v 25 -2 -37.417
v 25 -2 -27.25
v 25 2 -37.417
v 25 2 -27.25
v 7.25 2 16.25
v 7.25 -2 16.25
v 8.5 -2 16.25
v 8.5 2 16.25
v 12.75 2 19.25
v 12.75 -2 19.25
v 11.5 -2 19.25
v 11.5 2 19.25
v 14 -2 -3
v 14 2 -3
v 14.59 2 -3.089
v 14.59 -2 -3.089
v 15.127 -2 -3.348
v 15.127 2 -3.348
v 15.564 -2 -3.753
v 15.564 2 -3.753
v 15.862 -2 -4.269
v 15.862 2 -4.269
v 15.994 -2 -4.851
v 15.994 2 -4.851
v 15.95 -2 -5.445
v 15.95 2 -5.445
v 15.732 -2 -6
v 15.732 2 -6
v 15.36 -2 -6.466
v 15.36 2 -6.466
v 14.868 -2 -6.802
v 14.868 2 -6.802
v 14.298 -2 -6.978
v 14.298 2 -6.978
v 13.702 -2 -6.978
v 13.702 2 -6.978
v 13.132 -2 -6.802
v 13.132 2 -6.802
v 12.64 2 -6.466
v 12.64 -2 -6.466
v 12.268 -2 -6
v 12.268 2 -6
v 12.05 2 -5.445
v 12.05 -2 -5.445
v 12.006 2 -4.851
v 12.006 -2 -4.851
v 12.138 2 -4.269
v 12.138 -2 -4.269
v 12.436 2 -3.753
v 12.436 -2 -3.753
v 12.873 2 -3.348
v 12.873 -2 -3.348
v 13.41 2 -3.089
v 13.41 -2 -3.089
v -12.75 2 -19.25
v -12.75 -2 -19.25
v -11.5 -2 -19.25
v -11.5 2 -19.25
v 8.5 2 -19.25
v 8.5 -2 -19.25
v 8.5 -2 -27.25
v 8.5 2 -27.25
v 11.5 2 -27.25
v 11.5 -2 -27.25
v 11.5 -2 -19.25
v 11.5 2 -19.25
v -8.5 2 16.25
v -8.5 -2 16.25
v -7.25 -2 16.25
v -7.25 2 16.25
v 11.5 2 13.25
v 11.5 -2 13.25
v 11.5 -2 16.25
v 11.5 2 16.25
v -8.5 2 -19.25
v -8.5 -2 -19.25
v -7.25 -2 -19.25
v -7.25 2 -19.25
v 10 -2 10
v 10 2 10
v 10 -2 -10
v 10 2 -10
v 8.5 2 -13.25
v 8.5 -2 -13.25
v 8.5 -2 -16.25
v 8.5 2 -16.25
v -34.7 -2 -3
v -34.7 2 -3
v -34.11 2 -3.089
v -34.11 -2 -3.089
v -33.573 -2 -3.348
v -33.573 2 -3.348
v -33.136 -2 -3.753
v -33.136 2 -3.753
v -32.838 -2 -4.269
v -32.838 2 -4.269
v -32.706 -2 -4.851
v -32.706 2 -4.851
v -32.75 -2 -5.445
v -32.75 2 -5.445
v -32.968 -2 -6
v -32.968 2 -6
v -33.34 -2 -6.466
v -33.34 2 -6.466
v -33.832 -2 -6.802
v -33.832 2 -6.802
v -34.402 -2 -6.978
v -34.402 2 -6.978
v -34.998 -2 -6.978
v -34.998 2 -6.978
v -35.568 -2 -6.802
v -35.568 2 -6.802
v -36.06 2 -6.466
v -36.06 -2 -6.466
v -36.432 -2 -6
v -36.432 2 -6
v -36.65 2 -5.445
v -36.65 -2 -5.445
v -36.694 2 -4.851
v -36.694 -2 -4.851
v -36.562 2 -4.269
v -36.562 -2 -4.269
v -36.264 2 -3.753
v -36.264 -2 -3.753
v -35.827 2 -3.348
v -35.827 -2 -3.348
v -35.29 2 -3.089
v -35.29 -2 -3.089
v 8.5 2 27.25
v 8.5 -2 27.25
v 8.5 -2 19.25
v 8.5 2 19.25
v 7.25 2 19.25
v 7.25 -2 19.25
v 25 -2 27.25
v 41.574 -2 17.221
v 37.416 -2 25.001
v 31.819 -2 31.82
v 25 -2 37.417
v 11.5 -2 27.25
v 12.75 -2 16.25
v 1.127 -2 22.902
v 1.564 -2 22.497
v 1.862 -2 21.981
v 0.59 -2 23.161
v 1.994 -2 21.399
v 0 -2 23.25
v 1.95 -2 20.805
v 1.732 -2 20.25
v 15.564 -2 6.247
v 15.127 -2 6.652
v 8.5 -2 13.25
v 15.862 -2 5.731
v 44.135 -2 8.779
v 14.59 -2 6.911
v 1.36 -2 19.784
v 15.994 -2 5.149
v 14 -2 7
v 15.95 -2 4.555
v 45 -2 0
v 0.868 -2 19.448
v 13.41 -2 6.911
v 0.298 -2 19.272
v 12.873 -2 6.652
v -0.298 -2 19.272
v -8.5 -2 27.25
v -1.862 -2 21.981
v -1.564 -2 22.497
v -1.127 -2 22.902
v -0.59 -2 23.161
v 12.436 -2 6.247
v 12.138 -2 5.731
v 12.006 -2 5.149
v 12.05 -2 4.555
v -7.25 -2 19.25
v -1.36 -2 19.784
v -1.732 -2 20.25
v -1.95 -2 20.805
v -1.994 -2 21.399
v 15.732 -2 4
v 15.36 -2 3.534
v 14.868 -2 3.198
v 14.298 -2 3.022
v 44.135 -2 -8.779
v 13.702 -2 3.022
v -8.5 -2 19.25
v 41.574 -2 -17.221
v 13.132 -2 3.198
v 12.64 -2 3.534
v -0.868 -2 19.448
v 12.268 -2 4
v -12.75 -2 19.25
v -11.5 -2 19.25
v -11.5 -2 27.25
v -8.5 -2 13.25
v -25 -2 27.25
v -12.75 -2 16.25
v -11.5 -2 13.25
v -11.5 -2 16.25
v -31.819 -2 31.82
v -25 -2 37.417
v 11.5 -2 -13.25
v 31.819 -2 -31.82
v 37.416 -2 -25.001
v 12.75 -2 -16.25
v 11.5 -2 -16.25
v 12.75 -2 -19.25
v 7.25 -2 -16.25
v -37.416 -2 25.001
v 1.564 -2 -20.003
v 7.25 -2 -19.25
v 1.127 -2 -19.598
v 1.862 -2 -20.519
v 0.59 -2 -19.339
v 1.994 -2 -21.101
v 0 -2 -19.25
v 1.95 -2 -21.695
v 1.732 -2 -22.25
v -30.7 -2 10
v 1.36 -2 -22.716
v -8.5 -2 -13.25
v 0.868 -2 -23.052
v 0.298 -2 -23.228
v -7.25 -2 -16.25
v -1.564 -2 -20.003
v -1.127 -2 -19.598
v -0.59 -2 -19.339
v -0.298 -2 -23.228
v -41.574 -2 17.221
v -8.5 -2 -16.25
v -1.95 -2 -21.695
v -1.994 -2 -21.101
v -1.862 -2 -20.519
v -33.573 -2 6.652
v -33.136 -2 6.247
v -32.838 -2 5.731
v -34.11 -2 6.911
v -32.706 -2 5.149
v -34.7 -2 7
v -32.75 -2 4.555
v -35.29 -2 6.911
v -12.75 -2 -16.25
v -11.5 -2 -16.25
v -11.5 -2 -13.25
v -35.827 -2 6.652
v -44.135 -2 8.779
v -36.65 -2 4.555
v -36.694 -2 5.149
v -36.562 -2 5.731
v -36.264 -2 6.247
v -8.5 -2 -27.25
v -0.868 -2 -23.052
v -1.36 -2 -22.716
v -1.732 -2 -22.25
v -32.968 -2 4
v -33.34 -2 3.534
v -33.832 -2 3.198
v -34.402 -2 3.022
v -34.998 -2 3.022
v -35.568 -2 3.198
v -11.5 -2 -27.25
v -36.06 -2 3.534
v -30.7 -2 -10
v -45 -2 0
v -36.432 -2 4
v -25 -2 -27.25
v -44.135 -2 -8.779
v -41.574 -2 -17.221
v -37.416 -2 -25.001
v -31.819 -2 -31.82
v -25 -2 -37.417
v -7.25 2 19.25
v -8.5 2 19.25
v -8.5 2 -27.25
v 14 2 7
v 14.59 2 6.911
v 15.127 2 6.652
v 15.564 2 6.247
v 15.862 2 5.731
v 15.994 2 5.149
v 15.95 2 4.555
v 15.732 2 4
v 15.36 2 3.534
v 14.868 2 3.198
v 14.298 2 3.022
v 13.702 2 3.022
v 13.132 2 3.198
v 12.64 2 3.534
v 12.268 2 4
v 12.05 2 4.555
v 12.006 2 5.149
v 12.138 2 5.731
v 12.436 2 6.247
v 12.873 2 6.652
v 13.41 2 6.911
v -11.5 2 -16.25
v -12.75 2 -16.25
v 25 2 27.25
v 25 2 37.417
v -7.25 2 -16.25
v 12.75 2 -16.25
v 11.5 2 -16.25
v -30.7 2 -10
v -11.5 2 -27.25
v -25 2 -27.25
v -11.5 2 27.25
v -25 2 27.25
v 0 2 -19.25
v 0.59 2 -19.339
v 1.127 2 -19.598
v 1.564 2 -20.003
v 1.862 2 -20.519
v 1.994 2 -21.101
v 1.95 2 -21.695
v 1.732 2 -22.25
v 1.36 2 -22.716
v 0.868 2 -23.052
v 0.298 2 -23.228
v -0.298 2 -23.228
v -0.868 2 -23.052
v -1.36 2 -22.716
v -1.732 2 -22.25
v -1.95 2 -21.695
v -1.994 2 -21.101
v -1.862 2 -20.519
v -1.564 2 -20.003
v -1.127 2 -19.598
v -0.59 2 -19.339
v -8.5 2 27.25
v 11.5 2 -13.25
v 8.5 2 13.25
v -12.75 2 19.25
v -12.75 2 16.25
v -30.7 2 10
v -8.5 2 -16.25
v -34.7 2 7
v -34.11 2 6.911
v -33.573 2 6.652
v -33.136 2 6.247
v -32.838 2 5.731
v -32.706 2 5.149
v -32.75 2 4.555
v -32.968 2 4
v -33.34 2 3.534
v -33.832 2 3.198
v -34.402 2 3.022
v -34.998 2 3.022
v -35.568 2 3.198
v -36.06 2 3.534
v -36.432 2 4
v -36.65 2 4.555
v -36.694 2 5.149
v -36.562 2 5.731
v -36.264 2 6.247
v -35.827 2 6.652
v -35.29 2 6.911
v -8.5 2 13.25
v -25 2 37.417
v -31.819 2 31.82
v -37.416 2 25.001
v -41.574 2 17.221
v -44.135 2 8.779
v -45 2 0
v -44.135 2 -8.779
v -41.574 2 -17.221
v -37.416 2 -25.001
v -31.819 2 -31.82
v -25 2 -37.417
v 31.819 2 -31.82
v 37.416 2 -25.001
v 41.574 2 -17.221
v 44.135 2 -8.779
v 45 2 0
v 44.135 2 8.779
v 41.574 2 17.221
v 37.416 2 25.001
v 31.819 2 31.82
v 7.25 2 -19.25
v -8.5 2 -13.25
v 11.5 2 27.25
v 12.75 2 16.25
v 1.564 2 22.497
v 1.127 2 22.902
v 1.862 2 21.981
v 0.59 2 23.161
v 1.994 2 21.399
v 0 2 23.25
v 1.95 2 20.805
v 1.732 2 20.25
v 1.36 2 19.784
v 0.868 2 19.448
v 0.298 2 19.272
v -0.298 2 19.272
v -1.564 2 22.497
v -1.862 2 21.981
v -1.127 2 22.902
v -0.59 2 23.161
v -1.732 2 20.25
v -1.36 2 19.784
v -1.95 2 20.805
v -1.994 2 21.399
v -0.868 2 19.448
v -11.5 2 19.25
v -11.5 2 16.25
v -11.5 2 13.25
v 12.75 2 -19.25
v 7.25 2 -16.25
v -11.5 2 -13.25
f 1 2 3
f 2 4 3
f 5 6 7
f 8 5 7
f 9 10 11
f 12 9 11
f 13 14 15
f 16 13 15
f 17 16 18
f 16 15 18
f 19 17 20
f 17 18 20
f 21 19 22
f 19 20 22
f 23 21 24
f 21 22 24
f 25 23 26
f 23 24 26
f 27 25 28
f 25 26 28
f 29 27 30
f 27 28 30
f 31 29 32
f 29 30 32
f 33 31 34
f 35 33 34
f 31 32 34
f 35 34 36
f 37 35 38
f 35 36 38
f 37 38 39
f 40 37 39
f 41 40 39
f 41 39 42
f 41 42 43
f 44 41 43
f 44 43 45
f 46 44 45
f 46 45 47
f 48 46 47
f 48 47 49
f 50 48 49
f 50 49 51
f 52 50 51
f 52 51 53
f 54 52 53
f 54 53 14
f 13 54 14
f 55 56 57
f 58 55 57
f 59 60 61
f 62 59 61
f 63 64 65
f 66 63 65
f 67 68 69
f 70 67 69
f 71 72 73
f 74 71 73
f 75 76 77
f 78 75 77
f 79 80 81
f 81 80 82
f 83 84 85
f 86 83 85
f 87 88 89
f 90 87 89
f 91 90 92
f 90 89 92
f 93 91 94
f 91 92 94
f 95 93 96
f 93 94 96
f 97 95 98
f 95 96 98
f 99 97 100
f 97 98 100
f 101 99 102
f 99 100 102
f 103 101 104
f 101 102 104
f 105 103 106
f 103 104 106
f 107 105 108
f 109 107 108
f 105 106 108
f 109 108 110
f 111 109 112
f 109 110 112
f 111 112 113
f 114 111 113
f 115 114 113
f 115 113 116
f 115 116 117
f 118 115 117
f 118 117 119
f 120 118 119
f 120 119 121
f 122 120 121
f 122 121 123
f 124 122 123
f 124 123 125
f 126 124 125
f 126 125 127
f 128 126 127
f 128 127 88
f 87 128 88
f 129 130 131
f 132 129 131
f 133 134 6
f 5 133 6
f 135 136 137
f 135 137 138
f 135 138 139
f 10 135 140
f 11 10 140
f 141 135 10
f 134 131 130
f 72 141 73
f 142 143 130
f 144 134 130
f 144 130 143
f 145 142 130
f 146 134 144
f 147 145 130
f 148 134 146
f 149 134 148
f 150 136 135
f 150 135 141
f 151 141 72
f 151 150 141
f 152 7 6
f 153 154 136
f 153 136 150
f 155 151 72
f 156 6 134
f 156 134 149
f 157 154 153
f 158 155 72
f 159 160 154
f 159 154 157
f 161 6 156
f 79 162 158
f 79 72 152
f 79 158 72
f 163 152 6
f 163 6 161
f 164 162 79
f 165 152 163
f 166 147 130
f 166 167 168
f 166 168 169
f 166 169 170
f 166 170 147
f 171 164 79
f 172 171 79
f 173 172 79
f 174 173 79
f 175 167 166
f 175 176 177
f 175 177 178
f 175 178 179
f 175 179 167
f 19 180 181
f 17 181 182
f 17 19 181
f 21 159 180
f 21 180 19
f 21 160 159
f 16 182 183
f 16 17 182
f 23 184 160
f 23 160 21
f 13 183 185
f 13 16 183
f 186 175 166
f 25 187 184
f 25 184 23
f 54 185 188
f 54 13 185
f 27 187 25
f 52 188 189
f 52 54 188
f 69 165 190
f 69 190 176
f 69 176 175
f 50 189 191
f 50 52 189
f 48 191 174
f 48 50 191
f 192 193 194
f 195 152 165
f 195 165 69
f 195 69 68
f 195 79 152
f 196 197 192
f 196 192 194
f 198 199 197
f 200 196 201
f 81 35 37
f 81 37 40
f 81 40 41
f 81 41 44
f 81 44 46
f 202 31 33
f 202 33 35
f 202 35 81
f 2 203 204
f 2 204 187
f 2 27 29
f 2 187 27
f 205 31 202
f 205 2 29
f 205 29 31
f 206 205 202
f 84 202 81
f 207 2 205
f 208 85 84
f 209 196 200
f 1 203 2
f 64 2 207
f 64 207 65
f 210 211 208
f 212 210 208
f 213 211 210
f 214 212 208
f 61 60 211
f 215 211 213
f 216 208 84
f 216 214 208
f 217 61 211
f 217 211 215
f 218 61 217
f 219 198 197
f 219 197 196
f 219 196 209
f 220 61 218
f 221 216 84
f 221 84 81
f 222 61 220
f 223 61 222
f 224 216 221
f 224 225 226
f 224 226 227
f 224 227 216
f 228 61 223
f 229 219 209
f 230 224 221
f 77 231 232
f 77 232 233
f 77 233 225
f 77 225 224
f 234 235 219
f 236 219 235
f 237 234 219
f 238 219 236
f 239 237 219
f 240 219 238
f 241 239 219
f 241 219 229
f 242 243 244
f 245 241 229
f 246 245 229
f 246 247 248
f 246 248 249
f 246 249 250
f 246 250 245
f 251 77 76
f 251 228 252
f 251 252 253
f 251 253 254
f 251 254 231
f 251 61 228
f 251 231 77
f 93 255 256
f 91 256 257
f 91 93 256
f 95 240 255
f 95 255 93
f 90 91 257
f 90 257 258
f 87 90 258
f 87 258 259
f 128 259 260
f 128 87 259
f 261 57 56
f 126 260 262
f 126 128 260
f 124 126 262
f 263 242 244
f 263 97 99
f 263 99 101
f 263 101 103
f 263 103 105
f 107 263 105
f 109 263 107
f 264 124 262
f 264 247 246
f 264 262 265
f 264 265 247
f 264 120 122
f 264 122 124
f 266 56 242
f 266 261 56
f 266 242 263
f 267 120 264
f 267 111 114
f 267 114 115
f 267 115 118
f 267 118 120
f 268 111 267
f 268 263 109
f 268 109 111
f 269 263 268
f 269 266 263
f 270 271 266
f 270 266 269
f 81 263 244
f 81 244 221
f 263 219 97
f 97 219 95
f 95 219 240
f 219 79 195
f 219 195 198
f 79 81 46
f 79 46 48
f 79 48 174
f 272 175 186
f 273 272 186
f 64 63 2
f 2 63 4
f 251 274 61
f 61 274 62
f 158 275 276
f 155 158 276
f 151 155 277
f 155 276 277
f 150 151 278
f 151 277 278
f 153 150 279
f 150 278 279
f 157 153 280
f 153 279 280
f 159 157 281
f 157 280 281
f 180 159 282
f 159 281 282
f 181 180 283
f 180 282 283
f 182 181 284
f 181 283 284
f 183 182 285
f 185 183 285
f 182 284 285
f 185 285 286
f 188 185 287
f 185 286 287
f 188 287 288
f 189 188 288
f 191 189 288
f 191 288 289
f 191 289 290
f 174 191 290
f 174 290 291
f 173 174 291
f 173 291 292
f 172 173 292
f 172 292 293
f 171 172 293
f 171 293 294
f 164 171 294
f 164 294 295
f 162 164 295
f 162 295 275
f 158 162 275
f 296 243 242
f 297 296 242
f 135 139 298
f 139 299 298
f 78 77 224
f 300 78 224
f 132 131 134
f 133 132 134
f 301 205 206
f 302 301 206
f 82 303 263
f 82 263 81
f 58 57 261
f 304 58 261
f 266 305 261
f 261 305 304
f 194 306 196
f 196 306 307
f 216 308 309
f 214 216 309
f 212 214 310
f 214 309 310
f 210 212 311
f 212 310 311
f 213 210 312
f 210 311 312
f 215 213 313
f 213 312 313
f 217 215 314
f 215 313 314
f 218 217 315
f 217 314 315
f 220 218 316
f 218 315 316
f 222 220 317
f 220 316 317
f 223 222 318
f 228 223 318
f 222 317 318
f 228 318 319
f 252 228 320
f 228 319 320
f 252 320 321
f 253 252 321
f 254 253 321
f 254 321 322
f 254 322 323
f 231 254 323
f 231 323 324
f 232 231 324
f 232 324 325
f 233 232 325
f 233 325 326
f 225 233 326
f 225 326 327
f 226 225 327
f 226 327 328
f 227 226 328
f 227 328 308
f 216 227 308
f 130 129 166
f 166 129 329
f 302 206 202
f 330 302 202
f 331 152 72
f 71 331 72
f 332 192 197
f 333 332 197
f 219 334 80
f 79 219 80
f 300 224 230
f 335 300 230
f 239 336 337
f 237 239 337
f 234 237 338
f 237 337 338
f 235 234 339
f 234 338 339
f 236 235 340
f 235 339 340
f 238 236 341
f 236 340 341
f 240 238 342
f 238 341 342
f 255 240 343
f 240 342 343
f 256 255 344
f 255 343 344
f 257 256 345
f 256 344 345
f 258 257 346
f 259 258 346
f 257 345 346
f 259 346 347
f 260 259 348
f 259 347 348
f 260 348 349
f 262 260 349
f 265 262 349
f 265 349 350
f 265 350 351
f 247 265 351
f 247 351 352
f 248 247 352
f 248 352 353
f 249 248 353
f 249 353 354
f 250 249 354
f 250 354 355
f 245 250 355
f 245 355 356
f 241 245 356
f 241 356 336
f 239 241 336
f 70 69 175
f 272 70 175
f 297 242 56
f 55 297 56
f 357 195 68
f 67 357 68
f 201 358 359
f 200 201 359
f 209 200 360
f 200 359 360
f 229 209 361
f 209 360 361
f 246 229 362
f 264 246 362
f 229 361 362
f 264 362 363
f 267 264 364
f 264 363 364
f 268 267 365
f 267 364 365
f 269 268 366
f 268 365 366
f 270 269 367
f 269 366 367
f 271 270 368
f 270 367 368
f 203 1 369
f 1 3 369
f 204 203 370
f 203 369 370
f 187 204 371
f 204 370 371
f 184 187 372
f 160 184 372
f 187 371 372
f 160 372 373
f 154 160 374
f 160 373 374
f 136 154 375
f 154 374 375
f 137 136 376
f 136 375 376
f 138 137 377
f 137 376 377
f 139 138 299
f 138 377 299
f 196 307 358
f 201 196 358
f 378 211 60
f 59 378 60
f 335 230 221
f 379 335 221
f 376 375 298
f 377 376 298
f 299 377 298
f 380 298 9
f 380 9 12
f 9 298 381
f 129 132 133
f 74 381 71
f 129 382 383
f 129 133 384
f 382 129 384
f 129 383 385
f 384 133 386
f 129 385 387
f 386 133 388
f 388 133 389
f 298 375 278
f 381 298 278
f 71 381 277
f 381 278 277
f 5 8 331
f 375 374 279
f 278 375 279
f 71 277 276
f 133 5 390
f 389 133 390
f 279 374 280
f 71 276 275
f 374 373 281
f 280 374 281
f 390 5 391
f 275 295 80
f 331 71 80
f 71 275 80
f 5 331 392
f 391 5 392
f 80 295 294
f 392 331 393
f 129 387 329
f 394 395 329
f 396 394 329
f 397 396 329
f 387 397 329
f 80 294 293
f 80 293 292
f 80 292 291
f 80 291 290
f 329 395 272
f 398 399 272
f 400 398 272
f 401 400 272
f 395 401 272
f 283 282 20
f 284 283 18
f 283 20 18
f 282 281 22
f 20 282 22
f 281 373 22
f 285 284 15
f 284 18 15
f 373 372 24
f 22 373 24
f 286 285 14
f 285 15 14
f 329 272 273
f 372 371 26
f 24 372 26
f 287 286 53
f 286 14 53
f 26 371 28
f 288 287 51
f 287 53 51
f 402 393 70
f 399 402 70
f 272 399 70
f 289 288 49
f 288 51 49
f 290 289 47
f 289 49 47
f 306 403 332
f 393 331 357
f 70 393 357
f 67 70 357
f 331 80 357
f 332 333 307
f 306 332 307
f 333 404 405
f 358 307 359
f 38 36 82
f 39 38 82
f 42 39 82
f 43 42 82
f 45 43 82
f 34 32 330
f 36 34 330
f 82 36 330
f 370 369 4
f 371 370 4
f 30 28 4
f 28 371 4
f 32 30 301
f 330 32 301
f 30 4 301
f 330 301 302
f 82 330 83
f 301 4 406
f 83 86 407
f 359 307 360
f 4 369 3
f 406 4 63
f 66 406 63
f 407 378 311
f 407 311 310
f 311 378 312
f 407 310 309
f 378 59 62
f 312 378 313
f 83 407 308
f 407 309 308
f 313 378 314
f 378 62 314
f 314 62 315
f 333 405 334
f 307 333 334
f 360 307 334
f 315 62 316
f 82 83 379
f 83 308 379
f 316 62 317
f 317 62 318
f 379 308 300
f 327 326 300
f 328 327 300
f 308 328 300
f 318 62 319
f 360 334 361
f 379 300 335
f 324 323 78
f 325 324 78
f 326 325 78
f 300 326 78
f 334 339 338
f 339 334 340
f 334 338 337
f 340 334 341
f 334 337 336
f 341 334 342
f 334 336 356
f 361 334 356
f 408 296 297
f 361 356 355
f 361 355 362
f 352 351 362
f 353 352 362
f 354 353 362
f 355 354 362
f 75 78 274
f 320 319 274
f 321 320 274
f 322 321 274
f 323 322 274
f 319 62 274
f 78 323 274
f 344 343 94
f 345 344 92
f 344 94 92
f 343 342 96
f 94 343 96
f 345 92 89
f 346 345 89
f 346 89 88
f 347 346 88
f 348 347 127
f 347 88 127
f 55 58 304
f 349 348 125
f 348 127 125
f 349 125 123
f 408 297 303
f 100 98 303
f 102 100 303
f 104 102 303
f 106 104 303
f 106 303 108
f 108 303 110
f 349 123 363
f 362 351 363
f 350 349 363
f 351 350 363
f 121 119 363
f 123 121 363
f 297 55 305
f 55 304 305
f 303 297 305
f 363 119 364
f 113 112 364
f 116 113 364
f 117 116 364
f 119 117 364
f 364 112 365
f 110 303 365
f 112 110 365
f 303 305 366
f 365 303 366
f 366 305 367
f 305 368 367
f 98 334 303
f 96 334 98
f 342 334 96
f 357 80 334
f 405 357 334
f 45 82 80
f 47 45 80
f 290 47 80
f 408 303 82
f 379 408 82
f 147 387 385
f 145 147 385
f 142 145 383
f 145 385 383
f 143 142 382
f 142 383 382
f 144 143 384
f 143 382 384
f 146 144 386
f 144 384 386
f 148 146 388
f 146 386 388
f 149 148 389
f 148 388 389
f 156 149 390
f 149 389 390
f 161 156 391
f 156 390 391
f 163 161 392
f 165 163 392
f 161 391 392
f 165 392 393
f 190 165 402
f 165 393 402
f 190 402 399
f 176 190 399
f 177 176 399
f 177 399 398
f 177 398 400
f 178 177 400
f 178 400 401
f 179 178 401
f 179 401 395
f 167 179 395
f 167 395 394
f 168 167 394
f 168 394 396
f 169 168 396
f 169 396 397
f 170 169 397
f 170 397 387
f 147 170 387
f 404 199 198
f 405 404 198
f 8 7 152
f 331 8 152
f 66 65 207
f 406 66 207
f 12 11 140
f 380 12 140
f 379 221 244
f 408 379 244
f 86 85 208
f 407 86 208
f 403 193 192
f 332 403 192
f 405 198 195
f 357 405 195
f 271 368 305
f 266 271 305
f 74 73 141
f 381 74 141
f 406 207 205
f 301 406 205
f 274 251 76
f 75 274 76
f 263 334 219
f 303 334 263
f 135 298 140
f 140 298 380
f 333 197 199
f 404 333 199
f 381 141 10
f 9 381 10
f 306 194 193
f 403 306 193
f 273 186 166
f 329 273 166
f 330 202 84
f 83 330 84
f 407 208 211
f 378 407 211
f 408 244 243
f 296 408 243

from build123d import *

# Parameters (mm, degrees)
ESTRUSIONE_ESTRUSIONE1_DEPTH = 2
CORTAR_EXTRUIR4_DEPTH        = 10
CROQUIS2_R                   = 2
CROQUIS2_W                   = 40.7
CROQUIS2_H                   = 20
CORTAR_EXTRUIR5_DEPTH        = 59.660037504


with BuildPart() as part:
    # Schizzo1 → Estrusione-Estrusione1 (new, symmetric)
    with BuildSketch(Plane(origin=(0, 0, 0), x_dir=(1, 0, 0), z_dir=(0, 1, 0))):
        with BuildLine():
            Line((-25, 37.416573868), (-25, 27.25))
            Line((-25, 27.25), (25, 27.25))
            Line((25, 27.25), (25, 37.416573868))
            ThreePointArc((25, 37.416573868), (45, 0), (25, -37.416573868))
            Line((25, -37.416573868), (25, -27.25))
            Line((25, -27.25), (-25, -27.25))
            Line((-25, -27.25), (-25, -37.416573868))
            ThreePointArc((-25, -37.416573868), (-45, 0), (-25, 37.416573868))
        make_face()
    extrude(amount=ESTRUSIONE_ESTRUSIONE1_DEPTH, both=True)

    # Croquis1 → Cortar-Extruir4 (cut)
    with BuildSketch(Plane.XZ.offset(2)):
        Polygon((-8.5, 27.25), (-11.5, 27.25), (-11.5, 19.25), (-12.75, 19.25), (-12.75, 16.25), (-11.5, 16.25), (-11.5, 13.25), (-8.5, 13.25), (-8.5, 16.25), (-7.25, 16.25), (-7.25, 19.25), (-8.5, 19.25), align=None)
        Polygon((11.5, 27.25), (8.5, 27.25), (8.5, 19.25), (7.25, 19.25), (7.25, 16.25), (8.5, 16.25), (8.5, 13.25), (11.5, 13.25), (11.5, 16.25), (12.75, 16.25), (12.75, 19.25), (11.5, 19.25), align=None)
        Polygon((8.5, -13.25), (8.5, -16.25), (7.25, -16.25), (7.25, -19.25), (8.5, -19.25), (8.5, -27.25), (11.5, -27.25), (11.5, -19.25), (12.75, -19.25), (12.75, -16.25), (11.5, -16.25), (11.5, -13.25), align=None)
        Polygon((-11.5, -13.25), (-11.5, -16.25), (-12.75, -16.25), (-12.75, -19.25), (-11.5, -19.25), (-11.5, -27.25), (-8.5, -27.25), (-8.5, -19.25), (-7.25, -19.25), (-7.25, -16.25), (-8.5, -16.25), (-8.5, -13.25), align=None)
    extrude(amount=-CORTAR_EXTRUIR4_DEPTH, mode=Mode.SUBTRACT)

    # Croquis2 → Cortar-Extruir5 (cut, through all)
    with BuildSketch(Plane(origin=(0, 2, 0), x_dir=(1, 0, 0), z_dir=(0, 1, 0))):
        with Locations(Location((-34.7, 5, 0), (0, 0, 270))):
            Circle(CROQUIS2_R)
        with Locations(Location((-34.7, -5, 0), (0, 0, 270))):
            Circle(CROQUIS2_R)
        with Locations(Location((14, 5, 0), (0, 0, 270))):
            Circle(CROQUIS2_R)
        with Locations(Location((14, -5, 0), (0, 0, 270))):
            Circle(CROQUIS2_R)
        with Locations(Location((0, 21.25, 0), (0, 0, 270))):
            Circle(CROQUIS2_R)
        with Locations(Location((0, -21.25, 0), (0, 0, 270))):
            Circle(CROQUIS2_R)
        with Locations((-10.35, 0)):
            Rectangle(CROQUIS2_W, CROQUIS2_H)
    extrude(amount=-CORTAR_EXTRUIR5_DEPTH, mode=Mode.SUBTRACT)


solid = part.part
